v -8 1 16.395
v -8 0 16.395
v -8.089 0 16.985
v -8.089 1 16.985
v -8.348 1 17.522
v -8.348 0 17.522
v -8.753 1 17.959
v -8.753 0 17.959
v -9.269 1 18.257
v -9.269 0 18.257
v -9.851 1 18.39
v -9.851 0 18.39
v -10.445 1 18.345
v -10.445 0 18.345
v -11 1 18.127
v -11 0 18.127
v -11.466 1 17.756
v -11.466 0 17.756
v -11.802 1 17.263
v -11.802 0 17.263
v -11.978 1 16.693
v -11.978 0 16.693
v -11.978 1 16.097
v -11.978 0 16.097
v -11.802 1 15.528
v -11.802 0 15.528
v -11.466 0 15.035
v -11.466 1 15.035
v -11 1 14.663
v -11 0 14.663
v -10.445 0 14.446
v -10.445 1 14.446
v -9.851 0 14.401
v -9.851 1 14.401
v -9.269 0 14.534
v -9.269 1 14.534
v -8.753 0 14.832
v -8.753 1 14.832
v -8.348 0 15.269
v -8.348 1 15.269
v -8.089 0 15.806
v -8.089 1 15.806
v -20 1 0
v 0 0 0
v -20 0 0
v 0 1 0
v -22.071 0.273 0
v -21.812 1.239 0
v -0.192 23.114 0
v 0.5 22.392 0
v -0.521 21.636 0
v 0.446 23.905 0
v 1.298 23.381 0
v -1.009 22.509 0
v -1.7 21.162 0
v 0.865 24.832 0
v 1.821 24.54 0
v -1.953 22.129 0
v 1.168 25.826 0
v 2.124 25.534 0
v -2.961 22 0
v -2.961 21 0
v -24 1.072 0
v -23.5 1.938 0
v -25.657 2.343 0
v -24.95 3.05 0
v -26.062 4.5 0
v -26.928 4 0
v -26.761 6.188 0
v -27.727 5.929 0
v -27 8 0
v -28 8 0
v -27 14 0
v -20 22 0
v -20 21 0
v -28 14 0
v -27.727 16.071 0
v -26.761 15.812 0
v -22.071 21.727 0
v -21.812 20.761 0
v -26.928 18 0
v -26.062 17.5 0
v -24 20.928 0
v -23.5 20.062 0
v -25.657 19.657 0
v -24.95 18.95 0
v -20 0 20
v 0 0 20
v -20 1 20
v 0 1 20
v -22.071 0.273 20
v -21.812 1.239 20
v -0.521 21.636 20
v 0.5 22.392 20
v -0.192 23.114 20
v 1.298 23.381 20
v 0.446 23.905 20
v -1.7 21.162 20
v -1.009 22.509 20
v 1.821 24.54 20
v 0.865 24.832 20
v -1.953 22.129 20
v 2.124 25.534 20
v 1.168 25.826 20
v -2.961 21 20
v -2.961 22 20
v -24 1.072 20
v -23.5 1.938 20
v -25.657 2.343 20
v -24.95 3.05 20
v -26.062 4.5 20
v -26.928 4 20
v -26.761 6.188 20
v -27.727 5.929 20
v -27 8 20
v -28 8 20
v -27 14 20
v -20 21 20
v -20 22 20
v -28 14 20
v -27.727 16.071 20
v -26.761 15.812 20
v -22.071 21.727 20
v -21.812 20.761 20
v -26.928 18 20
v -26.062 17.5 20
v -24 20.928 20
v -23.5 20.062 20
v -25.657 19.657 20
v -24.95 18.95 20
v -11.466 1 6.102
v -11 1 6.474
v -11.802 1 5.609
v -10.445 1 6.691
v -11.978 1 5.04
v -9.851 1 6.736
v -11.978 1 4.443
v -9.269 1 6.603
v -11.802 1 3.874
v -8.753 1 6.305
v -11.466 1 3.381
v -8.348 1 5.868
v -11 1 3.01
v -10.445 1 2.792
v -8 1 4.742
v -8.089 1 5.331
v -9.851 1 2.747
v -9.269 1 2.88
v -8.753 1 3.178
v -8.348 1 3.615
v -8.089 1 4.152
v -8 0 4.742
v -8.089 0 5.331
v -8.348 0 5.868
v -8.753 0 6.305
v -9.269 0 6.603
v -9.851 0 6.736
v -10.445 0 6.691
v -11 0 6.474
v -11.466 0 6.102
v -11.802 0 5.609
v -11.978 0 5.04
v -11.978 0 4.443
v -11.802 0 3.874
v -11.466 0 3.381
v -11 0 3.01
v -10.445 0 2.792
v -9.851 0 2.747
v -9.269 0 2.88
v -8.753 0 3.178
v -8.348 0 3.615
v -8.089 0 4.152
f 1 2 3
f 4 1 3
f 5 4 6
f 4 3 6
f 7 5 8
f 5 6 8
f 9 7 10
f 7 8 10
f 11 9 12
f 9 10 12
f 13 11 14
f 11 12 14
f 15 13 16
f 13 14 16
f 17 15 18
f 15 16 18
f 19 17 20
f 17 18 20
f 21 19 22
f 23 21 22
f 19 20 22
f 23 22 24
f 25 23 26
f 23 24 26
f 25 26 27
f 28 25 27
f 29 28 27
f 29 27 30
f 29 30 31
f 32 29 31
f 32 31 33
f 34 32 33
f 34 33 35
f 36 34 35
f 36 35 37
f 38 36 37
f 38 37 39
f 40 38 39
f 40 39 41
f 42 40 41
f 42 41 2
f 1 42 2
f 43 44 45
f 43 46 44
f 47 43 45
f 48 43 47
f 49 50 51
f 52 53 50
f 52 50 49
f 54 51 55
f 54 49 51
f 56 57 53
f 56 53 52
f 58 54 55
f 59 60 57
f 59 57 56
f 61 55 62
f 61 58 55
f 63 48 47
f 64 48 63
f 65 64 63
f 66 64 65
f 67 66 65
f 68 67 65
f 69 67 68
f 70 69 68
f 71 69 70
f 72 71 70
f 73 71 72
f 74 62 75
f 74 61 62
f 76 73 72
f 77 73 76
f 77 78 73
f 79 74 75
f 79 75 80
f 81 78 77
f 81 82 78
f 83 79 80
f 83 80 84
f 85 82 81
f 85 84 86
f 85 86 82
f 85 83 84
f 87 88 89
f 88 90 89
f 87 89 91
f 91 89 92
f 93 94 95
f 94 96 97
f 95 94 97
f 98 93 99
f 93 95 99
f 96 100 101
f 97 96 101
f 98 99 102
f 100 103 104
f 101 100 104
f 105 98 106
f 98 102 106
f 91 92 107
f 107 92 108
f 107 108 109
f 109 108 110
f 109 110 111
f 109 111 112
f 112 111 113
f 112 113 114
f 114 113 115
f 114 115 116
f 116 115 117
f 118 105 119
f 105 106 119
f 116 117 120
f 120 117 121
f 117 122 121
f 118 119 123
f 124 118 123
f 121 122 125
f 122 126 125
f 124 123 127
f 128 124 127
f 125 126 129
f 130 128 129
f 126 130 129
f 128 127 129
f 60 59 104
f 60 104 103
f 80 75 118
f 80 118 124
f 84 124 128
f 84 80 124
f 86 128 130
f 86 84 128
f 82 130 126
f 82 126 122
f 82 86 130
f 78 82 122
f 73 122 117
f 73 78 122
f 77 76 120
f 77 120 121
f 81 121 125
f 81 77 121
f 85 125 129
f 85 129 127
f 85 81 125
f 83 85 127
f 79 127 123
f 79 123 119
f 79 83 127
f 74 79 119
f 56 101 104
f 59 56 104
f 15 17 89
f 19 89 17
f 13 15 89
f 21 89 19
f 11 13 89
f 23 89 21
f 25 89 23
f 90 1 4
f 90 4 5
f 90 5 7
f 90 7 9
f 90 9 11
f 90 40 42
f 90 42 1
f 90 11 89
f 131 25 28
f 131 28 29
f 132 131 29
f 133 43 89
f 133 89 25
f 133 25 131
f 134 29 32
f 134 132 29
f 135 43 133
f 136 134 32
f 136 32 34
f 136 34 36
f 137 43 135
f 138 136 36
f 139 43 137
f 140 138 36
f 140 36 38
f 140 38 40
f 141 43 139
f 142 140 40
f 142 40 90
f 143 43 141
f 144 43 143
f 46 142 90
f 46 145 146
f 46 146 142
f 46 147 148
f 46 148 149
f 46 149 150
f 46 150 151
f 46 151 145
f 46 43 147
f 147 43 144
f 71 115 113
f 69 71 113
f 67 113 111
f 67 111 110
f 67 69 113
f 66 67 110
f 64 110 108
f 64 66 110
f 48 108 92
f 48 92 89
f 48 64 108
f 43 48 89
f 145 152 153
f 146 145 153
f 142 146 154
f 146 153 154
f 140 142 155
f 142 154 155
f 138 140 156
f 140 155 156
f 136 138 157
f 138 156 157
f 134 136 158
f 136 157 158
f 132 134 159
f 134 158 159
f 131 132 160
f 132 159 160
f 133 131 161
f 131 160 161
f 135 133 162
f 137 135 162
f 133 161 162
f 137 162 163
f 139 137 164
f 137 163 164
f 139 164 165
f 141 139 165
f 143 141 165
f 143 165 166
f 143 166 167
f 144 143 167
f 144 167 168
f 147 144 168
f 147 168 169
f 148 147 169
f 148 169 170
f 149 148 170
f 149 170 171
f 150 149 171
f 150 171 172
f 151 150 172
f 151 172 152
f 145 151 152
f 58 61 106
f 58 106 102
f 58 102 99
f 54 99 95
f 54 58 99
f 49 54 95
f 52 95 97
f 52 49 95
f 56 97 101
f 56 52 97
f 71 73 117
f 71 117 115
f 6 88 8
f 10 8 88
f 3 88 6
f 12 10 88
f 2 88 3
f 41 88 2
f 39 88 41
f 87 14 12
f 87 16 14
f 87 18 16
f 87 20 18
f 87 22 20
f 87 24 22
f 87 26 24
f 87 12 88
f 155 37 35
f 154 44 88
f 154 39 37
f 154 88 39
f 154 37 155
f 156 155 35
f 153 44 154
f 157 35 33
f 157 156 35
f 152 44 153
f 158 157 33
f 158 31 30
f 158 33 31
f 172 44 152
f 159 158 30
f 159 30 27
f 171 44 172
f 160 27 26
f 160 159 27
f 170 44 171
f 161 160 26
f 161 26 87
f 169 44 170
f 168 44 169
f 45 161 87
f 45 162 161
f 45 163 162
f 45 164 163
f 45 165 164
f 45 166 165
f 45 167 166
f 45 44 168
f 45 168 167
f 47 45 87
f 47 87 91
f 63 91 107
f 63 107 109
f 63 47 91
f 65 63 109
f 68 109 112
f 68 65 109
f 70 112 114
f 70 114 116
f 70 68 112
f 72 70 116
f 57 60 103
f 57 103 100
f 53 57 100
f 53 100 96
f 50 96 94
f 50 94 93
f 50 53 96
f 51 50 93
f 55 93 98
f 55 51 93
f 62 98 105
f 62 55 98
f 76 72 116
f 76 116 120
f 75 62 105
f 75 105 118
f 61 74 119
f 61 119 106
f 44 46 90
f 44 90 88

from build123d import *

# Parameters (mm, degrees)
EXTRUS_O_FINA1_DEPTH  = 20
ESBO_O3_R             = 2
CORTE_EXTRUS_O1_DEPTH = 10


with BuildPart() as part:
    # Esboço1 → Extrusão-Fina1 (new body)
    with BuildSketch(Plane.XY):
        with BuildLine():
            Line((0, 0), (-20, 0))
            ThreePointArc((-20, 0), (-25.656854249, 2.343145751), (-28, 8))
            Line((-28, 8), (-28, 14))
            ThreePointArc((-28, 14), (-25.656854249, 19.656854249), (-20, 22))
            Line((-20, 22), (-2.961110141, 22))
            ThreePointArc((-2.961110141, 22), (-0.581161614, 22.785059097), (0.864586792, 24.832077496))
            Line((0.864586792, 24.832077496), (1.167922504, 25.825696933))
            Line((1.167922504, 25.825696933), (2.124346737, 25.533716307))
            Line((2.124346737, 25.533716307), (1.821011026, 24.54009687))
            ThreePointArc((1.821011026, 24.54009687), (0.013825518, 21.981323872), (-2.961110141, 21))
            Line((-2.961110141, 21), (-20, 21))
            ThreePointArc((-20, 21), (-24.949747468, 18.949747468), (-27, 14))
            Line((-27, 14), (-27, 8))
            ThreePointArc((-27, 8), (-24.949747468, 3.050252532), (-20, 1))
            Line((-20, 1), (0, 1))
            Line((0, 1), (0, 0))
        make_face()
    extrude(amount=EXTRUS_O_FINA1_DEPTH)

    # Esboço3 → Corte-extrusão1 (cut)
    with BuildSketch(Plane.XZ):
        with Locations((-10, 16.395406789)):
            Circle(ESBO_O3_R)
        with Locations((-10, 4.741554418)):
            Circle(ESBO_O3_R)
    extrude(amount=-CORTE_EXTRUS_O1_DEPTH, mode=Mode.SUBTRACT)


solid = part.part
